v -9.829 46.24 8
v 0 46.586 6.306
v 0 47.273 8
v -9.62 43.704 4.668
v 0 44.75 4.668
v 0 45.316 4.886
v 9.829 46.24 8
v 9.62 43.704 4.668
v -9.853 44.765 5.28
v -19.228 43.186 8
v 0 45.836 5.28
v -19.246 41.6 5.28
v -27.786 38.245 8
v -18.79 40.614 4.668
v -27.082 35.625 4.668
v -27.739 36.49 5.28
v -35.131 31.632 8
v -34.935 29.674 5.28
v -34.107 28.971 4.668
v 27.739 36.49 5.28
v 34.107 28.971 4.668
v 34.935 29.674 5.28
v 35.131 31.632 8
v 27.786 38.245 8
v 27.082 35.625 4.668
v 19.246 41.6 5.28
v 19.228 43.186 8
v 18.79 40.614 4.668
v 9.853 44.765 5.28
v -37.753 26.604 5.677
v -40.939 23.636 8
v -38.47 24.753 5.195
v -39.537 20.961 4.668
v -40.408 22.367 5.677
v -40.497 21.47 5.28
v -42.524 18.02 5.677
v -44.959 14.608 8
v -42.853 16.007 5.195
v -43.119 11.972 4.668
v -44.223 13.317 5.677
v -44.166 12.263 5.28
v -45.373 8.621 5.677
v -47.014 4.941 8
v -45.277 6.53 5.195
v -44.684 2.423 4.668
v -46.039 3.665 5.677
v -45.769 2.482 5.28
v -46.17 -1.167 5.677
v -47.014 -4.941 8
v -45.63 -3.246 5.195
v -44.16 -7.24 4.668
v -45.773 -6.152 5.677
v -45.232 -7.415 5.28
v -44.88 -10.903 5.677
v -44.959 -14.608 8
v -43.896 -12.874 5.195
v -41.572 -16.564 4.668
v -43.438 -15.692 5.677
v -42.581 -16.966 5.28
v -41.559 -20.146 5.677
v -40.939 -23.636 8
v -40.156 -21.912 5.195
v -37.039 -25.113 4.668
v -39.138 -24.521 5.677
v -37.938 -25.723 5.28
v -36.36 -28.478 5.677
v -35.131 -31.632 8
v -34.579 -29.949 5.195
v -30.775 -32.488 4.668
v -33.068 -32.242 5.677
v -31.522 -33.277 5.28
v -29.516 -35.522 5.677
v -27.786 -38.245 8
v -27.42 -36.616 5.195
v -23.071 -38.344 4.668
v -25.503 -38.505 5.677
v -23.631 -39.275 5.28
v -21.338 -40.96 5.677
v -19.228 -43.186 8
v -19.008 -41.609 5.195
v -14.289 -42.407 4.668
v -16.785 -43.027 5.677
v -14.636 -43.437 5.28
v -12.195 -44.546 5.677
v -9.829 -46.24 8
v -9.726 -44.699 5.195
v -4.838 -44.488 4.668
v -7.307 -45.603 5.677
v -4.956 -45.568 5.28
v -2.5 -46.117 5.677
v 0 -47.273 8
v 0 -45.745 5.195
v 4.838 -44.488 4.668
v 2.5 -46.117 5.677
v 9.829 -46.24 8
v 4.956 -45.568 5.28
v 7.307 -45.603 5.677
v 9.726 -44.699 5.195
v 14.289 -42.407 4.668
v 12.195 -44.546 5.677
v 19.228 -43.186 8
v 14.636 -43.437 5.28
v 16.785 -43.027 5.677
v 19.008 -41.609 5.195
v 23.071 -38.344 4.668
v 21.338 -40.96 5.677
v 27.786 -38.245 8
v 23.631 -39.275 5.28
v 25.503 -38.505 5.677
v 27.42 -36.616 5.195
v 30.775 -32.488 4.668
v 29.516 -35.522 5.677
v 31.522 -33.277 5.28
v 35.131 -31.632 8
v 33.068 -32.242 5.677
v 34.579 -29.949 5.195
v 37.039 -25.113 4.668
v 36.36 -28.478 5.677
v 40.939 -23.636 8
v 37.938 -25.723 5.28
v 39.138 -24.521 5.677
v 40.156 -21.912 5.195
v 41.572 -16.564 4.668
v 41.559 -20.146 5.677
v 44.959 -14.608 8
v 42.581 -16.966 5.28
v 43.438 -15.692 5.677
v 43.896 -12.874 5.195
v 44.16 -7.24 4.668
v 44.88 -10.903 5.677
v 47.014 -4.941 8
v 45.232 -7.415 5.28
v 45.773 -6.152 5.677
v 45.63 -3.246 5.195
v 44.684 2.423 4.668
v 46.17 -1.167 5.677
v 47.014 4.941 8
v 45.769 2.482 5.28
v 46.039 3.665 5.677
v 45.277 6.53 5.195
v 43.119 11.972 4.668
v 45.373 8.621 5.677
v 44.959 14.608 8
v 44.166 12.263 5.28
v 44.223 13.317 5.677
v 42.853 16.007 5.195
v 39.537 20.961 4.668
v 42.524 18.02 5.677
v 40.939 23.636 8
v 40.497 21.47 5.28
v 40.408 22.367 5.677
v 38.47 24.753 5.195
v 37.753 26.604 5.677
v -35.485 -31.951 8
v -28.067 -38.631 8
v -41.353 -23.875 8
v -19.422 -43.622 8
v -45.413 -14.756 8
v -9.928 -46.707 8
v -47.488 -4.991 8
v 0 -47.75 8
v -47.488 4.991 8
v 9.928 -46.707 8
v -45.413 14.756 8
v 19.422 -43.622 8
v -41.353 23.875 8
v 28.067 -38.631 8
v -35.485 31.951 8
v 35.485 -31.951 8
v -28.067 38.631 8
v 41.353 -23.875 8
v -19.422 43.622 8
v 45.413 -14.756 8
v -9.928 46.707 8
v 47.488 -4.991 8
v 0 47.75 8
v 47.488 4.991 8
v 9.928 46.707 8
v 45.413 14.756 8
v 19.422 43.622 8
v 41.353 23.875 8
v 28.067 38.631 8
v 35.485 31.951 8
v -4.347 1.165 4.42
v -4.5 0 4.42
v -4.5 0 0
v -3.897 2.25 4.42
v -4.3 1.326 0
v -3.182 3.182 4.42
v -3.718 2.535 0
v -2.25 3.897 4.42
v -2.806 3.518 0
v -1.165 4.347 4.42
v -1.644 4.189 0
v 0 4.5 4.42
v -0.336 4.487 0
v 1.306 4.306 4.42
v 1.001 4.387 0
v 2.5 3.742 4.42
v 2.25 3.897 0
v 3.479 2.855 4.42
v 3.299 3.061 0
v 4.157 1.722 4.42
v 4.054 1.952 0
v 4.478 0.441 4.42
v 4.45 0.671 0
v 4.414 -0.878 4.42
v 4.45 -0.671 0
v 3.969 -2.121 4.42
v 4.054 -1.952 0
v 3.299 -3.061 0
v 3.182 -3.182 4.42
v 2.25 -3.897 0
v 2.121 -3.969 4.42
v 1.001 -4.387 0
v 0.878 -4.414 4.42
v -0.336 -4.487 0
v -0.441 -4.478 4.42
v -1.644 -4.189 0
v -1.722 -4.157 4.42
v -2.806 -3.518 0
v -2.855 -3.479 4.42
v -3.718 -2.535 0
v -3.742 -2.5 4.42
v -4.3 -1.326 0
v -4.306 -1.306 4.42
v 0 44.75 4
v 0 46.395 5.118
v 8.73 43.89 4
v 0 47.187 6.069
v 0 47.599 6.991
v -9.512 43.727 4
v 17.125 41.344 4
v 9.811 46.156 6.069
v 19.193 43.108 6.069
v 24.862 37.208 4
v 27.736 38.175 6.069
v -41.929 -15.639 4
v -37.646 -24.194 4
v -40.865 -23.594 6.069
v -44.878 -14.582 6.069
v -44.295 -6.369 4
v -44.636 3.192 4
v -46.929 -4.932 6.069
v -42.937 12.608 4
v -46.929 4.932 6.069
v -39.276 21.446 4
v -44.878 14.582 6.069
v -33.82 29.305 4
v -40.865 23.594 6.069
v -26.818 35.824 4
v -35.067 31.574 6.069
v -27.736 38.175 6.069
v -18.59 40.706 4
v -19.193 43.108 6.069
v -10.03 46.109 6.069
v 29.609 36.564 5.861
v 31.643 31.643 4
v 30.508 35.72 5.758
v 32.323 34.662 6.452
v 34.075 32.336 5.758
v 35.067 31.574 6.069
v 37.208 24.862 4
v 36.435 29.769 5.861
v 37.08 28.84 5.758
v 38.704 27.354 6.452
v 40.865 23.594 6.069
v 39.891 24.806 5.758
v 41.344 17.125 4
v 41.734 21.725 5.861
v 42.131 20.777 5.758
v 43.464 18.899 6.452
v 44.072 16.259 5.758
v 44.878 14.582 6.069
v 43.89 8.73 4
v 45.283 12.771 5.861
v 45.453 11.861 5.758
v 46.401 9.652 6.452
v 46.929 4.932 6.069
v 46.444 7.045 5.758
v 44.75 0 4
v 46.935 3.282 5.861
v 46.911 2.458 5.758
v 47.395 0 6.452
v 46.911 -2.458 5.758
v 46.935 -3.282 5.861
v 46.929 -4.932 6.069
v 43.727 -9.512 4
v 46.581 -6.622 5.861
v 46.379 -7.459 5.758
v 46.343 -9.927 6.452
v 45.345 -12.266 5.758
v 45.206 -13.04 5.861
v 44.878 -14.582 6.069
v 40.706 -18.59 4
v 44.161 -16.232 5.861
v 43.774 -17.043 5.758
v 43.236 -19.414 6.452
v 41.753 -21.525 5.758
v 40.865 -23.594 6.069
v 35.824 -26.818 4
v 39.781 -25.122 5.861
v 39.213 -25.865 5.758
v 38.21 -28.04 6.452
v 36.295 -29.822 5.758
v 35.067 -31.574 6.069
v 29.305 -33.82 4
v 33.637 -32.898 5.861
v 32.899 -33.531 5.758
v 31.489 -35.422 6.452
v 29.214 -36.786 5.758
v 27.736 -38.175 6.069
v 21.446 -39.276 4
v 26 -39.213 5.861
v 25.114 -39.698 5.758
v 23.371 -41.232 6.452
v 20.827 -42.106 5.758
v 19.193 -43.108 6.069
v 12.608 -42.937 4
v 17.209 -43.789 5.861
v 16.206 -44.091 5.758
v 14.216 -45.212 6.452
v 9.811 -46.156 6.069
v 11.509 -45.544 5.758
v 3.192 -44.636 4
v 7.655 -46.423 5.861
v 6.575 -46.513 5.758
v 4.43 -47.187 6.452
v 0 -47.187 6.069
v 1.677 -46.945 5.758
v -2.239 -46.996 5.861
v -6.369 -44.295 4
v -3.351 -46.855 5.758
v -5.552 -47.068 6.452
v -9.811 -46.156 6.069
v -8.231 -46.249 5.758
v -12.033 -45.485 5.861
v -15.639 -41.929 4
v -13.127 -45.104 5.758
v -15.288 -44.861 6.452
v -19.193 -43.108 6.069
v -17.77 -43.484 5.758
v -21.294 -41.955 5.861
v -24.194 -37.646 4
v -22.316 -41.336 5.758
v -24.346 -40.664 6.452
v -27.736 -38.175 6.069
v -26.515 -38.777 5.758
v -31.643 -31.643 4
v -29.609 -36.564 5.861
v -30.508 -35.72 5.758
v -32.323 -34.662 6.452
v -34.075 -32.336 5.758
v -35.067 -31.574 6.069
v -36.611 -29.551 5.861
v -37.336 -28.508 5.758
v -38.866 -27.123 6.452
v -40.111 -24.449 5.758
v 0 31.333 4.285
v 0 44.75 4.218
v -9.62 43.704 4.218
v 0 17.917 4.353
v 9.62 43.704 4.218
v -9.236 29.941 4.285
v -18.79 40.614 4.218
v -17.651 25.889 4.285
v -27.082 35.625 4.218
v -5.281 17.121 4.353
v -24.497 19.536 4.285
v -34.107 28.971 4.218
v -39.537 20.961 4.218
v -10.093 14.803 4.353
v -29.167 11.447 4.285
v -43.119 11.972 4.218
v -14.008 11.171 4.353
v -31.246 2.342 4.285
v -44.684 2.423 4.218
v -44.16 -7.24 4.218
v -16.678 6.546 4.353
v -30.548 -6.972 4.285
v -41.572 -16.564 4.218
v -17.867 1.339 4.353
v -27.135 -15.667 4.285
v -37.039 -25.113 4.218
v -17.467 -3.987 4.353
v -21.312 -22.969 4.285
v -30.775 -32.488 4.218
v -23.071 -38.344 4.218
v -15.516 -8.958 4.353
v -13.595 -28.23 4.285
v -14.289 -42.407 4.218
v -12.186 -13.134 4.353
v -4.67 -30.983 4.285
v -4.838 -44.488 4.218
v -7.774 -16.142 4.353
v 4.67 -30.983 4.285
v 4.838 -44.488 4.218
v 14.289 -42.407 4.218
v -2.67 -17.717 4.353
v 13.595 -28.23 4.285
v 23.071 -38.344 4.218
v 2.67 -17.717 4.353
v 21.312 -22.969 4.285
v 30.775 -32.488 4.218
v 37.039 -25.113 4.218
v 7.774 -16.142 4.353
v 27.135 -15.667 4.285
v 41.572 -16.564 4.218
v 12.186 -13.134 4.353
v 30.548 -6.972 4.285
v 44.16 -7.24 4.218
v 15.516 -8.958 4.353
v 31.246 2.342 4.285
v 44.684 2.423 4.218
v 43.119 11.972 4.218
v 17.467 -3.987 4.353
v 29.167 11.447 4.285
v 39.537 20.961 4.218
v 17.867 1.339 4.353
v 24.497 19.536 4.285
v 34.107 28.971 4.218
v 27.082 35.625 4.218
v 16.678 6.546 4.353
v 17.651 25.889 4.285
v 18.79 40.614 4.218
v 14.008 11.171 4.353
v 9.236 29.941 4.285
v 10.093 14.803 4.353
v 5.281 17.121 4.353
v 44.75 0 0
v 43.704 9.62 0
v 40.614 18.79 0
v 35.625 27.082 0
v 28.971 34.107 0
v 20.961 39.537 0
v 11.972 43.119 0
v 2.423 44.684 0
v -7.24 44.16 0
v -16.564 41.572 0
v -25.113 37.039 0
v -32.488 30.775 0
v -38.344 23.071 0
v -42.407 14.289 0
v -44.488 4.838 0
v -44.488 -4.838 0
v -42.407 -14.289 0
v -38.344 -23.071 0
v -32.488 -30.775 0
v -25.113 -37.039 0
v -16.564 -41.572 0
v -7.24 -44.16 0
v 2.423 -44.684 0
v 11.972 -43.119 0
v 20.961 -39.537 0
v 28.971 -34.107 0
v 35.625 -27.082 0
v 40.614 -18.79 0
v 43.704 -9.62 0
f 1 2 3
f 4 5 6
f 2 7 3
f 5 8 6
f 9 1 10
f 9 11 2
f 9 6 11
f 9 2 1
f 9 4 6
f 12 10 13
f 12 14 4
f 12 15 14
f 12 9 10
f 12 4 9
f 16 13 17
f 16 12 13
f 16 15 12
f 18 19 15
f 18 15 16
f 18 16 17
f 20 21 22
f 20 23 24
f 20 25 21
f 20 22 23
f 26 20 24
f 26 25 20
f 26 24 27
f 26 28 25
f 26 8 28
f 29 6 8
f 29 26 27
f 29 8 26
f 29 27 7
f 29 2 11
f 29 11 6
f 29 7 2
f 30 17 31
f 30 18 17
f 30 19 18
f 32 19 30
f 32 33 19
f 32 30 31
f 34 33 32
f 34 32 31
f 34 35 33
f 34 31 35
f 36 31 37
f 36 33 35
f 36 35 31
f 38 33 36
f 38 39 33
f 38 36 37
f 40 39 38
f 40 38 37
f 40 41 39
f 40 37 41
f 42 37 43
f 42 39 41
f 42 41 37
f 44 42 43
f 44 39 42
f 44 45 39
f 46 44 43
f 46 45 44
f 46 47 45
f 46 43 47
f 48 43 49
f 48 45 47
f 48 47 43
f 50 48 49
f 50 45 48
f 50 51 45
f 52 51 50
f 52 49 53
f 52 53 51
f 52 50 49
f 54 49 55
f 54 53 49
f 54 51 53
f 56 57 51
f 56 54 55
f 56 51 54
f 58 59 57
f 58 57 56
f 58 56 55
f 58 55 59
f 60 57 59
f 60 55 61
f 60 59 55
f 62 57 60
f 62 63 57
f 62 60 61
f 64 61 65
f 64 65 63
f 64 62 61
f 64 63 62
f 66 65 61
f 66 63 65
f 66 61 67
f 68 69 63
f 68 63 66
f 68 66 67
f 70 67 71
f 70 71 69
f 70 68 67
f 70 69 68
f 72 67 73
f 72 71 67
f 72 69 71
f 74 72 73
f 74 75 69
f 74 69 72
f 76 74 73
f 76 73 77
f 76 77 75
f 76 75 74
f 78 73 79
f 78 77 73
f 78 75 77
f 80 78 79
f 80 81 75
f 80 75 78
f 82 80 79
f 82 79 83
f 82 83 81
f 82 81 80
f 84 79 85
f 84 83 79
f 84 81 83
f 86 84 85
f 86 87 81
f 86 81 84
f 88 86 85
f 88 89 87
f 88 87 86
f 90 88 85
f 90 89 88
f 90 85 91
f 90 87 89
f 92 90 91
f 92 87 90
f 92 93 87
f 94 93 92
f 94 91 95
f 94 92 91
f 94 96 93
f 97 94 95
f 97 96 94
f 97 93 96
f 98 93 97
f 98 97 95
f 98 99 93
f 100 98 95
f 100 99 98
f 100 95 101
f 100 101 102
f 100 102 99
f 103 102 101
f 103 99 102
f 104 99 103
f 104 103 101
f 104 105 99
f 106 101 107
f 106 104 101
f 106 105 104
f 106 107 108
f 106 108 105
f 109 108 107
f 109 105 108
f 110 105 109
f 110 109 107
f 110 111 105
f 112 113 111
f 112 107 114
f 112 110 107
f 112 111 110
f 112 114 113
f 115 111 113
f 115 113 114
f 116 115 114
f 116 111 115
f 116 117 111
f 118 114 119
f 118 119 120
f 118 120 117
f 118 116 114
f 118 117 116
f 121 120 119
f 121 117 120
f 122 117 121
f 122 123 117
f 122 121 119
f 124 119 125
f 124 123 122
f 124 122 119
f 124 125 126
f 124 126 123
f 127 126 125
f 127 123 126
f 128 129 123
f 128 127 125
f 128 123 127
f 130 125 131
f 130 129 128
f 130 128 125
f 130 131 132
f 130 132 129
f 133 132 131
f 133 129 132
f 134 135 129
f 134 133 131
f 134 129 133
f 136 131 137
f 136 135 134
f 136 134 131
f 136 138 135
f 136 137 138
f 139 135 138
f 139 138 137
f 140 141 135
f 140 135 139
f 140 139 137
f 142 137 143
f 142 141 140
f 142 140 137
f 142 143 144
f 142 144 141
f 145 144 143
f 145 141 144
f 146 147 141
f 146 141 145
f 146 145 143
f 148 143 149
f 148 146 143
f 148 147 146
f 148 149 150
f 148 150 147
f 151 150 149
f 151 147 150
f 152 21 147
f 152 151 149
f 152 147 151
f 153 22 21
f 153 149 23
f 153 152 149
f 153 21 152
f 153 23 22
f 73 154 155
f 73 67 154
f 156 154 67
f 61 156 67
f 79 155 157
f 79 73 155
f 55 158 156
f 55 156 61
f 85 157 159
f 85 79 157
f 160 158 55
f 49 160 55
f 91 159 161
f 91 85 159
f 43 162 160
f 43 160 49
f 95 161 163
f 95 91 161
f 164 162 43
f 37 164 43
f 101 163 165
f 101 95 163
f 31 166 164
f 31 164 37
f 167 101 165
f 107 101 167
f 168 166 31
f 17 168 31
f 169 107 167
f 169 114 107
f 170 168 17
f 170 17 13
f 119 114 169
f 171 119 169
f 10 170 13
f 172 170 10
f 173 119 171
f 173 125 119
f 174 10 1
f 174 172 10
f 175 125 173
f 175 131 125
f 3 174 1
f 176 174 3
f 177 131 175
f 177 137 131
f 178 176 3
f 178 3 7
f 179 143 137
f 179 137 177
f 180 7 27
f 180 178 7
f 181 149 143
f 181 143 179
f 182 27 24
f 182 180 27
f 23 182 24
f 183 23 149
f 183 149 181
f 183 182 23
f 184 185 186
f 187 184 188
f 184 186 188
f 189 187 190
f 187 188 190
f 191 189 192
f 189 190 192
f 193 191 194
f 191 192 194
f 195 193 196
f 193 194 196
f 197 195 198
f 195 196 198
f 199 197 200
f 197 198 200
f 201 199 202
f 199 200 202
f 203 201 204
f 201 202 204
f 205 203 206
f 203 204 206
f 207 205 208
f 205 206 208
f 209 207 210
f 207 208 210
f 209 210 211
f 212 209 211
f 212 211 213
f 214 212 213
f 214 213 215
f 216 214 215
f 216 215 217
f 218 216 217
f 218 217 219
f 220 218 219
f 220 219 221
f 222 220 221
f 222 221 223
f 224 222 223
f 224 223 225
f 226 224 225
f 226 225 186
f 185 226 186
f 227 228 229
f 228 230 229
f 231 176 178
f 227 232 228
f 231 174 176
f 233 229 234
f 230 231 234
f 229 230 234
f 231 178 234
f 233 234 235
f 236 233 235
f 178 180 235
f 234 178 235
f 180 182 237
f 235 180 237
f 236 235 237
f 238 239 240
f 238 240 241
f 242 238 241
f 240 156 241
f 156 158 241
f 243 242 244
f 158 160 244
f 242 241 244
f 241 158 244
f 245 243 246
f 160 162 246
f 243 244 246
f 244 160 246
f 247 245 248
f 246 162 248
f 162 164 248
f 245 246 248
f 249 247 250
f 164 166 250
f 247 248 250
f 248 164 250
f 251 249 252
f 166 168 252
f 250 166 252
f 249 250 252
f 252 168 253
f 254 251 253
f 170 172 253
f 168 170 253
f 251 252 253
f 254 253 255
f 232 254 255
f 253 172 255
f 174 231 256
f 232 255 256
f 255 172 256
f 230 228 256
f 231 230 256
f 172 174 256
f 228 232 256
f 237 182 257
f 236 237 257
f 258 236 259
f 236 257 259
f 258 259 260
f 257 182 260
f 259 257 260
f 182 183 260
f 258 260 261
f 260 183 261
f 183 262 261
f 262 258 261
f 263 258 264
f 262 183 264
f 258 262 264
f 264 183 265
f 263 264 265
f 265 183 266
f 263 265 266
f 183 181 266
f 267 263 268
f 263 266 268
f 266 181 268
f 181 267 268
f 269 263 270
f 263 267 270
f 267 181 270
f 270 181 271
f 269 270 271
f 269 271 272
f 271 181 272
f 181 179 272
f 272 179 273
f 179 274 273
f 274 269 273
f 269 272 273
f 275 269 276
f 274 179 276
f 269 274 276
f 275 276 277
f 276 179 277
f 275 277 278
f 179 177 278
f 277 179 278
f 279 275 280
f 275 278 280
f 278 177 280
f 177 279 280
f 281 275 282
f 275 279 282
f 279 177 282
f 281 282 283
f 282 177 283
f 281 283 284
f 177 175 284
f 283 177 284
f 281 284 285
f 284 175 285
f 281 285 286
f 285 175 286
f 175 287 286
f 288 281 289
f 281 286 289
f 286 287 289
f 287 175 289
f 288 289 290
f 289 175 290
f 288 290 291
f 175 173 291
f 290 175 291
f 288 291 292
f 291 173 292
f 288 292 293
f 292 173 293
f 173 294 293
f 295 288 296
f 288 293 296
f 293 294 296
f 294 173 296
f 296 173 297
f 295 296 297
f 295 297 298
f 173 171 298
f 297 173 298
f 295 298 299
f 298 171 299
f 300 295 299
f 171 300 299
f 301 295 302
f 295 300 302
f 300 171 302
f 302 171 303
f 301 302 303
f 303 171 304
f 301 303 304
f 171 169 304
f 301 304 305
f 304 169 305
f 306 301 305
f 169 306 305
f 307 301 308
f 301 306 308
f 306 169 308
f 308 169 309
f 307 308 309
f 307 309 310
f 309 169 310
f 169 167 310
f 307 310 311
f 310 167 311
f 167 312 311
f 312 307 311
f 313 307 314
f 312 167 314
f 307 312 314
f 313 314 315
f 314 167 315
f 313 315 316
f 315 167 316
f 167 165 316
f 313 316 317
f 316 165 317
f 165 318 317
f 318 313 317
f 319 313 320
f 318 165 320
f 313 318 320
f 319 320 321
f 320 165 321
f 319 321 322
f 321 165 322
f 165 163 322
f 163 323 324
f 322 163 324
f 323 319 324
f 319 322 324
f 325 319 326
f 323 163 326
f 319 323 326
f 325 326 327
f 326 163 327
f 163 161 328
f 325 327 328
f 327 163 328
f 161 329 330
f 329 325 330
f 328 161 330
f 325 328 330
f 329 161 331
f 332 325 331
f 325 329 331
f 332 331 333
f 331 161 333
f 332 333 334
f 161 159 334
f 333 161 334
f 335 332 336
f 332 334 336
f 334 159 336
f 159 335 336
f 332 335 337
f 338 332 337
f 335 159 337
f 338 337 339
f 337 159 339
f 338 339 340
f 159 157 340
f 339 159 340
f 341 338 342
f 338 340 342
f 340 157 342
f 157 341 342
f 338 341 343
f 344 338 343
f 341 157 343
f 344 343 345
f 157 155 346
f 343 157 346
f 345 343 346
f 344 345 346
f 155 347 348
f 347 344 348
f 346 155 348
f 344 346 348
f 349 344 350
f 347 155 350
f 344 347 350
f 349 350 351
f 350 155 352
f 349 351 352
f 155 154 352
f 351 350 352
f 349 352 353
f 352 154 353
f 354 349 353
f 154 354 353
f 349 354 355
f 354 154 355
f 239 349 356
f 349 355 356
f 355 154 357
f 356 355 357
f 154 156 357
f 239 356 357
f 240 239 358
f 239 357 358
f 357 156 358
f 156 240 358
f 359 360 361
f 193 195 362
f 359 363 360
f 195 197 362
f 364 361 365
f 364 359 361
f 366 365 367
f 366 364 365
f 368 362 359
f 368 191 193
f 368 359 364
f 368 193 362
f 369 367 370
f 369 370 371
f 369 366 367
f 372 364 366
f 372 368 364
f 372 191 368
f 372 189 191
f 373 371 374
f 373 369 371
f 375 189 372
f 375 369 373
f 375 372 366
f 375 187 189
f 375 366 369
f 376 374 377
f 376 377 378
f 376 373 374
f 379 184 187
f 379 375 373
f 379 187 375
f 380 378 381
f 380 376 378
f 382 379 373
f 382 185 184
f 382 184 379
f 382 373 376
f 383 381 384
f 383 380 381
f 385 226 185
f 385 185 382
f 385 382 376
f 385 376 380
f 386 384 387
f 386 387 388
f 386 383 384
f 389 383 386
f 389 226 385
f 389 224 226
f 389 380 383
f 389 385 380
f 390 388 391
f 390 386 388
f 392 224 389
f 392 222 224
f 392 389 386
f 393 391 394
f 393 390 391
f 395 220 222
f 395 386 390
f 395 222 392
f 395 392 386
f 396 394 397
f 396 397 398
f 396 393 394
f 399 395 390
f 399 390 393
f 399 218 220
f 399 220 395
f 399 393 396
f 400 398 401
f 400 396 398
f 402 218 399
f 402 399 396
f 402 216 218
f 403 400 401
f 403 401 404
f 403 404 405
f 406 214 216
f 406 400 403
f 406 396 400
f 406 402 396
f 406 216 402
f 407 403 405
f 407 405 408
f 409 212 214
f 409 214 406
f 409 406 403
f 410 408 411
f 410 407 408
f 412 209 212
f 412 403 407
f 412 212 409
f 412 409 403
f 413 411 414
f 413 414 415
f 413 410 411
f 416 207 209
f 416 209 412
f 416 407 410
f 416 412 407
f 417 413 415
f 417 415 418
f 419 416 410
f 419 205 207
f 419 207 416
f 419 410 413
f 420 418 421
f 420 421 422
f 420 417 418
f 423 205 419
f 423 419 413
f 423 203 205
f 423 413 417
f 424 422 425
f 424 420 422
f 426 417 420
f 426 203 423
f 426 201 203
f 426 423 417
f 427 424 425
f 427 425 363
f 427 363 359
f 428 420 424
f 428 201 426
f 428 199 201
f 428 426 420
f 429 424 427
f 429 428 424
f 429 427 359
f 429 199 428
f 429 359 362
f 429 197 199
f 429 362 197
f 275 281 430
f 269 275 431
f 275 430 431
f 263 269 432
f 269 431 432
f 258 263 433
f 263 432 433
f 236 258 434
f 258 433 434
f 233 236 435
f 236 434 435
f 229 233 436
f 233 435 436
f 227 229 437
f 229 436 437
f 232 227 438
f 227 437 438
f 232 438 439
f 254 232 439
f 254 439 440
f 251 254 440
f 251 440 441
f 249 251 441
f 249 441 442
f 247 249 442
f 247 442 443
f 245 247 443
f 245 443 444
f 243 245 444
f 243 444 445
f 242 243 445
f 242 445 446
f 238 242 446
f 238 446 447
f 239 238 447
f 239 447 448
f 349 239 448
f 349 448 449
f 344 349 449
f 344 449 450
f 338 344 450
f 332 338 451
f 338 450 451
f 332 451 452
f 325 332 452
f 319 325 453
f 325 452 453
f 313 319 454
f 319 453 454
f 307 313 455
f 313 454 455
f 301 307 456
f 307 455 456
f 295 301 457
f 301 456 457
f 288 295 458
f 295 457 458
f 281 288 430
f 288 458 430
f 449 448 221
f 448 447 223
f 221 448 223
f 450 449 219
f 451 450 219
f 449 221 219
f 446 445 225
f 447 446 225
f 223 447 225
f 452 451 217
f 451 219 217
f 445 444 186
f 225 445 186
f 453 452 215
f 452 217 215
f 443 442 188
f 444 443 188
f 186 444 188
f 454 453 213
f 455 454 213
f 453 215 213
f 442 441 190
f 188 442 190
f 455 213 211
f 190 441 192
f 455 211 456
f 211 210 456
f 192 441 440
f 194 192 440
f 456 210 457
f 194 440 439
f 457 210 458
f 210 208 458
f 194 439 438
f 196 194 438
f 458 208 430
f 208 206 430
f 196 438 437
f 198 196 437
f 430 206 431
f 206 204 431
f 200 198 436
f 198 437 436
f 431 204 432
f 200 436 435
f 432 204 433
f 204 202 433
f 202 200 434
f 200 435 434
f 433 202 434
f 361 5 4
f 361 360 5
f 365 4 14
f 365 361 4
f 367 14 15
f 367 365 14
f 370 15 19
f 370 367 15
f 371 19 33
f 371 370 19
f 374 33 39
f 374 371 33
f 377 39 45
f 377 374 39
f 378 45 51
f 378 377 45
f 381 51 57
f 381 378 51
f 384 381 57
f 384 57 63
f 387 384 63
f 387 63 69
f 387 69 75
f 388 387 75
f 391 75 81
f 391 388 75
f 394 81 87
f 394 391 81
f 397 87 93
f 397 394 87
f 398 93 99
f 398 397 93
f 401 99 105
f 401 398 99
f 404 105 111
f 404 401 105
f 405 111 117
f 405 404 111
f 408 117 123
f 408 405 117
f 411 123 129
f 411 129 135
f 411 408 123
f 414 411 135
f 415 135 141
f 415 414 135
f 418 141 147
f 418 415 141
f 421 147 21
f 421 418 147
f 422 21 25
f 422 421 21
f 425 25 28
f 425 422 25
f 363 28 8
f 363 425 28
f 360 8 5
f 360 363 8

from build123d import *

# Parameters (mm, degrees)
SKETCH1_R           = 44.75
BOSS_EXTRUDE1_DEPTH = 4
SKETCH2_R           = 47.75
BOSS_EXTRUDE2_DEPTH = 4
SKETCH5_R           = 4.5
CUT_EXTRUDE1_DEPTH  = 10


with BuildPart() as part:
    # Sketch1 → Boss-Extrude1 (new body)
    with BuildSketch(Plane.XY):
        Circle(SKETCH1_R)
    extrude(amount=BOSS_EXTRUDE1_DEPTH)

    # Sketch2 → Boss-Extrude2 (add)
    with BuildSketch(Plane.XY.offset(4)):
        Circle(SKETCH2_R)
    extrude(amount=BOSS_EXTRUDE2_DEPTH)

    # Sketch3 → Cut-Revolve1 (revolve, cut)
    with BuildSketch(Plane(origin=(0, 0, 0), x_dir=(0, 0, -1), z_dir=(1, 0, 0))):
        with BuildLine():
            Line((-4, 47.75), (-4, 44.75))
            add(Edge.make_bspline(
                [(-4, 44.75), (-5.51655106, 47.70034682), (-8, 47.75)],
                knots=[0, 0, 0, 0.96689788, 0.96689788, 0.96689788], degree=2))
            Line((-8, 47.75), (-4, 47.75))
        make_face()
    revolve(axis=Axis((0, 0, 14.618090142), (0, 0, -1)), mode=Mode.SUBTRACT)

    # Sketch4 → Cut-Revolve3 (revolve, cut)
    with BuildSketch(Plane(origin=(0, 0, 0), x_dir=(0, 0, -1), z_dir=(1, 0, 0))):
        with BuildLine():
            Line((-4.667863656, 44.75), (-4.217612647, 44.75))
            Line((-4.217612647, 44.75), (-4.442738152, 0))
            Line((-4.442738152, 0), (-8, 0))
            Line((-8, 0), (-8, 47.272851402))
            add(Edge.make_bspline(
                [(-8, 47.272851402), (-5.020669257, 46.35865801), (-4.667863656, 44.75)],
                knots=[0, 0, 0, 0.52721511, 0.52721511, 0.52721511], degree=2))
        make_face()
    revolve(axis=Axis((0, 0, 4.442738152), (0, 0, 1)), mode=Mode.SUBTRACT)

    # Sketch5 → Cut-Extrude1 (cut)
    with BuildSketch(Plane(origin=(0, 0, 0), x_dir=(-1, 0, 0), z_dir=(0, 0, -1))):
        Circle(SKETCH5_R)
    extrude(amount=-CUT_EXTRUDE1_DEPTH, mode=Mode.SUBTRACT)


solid = part.part
